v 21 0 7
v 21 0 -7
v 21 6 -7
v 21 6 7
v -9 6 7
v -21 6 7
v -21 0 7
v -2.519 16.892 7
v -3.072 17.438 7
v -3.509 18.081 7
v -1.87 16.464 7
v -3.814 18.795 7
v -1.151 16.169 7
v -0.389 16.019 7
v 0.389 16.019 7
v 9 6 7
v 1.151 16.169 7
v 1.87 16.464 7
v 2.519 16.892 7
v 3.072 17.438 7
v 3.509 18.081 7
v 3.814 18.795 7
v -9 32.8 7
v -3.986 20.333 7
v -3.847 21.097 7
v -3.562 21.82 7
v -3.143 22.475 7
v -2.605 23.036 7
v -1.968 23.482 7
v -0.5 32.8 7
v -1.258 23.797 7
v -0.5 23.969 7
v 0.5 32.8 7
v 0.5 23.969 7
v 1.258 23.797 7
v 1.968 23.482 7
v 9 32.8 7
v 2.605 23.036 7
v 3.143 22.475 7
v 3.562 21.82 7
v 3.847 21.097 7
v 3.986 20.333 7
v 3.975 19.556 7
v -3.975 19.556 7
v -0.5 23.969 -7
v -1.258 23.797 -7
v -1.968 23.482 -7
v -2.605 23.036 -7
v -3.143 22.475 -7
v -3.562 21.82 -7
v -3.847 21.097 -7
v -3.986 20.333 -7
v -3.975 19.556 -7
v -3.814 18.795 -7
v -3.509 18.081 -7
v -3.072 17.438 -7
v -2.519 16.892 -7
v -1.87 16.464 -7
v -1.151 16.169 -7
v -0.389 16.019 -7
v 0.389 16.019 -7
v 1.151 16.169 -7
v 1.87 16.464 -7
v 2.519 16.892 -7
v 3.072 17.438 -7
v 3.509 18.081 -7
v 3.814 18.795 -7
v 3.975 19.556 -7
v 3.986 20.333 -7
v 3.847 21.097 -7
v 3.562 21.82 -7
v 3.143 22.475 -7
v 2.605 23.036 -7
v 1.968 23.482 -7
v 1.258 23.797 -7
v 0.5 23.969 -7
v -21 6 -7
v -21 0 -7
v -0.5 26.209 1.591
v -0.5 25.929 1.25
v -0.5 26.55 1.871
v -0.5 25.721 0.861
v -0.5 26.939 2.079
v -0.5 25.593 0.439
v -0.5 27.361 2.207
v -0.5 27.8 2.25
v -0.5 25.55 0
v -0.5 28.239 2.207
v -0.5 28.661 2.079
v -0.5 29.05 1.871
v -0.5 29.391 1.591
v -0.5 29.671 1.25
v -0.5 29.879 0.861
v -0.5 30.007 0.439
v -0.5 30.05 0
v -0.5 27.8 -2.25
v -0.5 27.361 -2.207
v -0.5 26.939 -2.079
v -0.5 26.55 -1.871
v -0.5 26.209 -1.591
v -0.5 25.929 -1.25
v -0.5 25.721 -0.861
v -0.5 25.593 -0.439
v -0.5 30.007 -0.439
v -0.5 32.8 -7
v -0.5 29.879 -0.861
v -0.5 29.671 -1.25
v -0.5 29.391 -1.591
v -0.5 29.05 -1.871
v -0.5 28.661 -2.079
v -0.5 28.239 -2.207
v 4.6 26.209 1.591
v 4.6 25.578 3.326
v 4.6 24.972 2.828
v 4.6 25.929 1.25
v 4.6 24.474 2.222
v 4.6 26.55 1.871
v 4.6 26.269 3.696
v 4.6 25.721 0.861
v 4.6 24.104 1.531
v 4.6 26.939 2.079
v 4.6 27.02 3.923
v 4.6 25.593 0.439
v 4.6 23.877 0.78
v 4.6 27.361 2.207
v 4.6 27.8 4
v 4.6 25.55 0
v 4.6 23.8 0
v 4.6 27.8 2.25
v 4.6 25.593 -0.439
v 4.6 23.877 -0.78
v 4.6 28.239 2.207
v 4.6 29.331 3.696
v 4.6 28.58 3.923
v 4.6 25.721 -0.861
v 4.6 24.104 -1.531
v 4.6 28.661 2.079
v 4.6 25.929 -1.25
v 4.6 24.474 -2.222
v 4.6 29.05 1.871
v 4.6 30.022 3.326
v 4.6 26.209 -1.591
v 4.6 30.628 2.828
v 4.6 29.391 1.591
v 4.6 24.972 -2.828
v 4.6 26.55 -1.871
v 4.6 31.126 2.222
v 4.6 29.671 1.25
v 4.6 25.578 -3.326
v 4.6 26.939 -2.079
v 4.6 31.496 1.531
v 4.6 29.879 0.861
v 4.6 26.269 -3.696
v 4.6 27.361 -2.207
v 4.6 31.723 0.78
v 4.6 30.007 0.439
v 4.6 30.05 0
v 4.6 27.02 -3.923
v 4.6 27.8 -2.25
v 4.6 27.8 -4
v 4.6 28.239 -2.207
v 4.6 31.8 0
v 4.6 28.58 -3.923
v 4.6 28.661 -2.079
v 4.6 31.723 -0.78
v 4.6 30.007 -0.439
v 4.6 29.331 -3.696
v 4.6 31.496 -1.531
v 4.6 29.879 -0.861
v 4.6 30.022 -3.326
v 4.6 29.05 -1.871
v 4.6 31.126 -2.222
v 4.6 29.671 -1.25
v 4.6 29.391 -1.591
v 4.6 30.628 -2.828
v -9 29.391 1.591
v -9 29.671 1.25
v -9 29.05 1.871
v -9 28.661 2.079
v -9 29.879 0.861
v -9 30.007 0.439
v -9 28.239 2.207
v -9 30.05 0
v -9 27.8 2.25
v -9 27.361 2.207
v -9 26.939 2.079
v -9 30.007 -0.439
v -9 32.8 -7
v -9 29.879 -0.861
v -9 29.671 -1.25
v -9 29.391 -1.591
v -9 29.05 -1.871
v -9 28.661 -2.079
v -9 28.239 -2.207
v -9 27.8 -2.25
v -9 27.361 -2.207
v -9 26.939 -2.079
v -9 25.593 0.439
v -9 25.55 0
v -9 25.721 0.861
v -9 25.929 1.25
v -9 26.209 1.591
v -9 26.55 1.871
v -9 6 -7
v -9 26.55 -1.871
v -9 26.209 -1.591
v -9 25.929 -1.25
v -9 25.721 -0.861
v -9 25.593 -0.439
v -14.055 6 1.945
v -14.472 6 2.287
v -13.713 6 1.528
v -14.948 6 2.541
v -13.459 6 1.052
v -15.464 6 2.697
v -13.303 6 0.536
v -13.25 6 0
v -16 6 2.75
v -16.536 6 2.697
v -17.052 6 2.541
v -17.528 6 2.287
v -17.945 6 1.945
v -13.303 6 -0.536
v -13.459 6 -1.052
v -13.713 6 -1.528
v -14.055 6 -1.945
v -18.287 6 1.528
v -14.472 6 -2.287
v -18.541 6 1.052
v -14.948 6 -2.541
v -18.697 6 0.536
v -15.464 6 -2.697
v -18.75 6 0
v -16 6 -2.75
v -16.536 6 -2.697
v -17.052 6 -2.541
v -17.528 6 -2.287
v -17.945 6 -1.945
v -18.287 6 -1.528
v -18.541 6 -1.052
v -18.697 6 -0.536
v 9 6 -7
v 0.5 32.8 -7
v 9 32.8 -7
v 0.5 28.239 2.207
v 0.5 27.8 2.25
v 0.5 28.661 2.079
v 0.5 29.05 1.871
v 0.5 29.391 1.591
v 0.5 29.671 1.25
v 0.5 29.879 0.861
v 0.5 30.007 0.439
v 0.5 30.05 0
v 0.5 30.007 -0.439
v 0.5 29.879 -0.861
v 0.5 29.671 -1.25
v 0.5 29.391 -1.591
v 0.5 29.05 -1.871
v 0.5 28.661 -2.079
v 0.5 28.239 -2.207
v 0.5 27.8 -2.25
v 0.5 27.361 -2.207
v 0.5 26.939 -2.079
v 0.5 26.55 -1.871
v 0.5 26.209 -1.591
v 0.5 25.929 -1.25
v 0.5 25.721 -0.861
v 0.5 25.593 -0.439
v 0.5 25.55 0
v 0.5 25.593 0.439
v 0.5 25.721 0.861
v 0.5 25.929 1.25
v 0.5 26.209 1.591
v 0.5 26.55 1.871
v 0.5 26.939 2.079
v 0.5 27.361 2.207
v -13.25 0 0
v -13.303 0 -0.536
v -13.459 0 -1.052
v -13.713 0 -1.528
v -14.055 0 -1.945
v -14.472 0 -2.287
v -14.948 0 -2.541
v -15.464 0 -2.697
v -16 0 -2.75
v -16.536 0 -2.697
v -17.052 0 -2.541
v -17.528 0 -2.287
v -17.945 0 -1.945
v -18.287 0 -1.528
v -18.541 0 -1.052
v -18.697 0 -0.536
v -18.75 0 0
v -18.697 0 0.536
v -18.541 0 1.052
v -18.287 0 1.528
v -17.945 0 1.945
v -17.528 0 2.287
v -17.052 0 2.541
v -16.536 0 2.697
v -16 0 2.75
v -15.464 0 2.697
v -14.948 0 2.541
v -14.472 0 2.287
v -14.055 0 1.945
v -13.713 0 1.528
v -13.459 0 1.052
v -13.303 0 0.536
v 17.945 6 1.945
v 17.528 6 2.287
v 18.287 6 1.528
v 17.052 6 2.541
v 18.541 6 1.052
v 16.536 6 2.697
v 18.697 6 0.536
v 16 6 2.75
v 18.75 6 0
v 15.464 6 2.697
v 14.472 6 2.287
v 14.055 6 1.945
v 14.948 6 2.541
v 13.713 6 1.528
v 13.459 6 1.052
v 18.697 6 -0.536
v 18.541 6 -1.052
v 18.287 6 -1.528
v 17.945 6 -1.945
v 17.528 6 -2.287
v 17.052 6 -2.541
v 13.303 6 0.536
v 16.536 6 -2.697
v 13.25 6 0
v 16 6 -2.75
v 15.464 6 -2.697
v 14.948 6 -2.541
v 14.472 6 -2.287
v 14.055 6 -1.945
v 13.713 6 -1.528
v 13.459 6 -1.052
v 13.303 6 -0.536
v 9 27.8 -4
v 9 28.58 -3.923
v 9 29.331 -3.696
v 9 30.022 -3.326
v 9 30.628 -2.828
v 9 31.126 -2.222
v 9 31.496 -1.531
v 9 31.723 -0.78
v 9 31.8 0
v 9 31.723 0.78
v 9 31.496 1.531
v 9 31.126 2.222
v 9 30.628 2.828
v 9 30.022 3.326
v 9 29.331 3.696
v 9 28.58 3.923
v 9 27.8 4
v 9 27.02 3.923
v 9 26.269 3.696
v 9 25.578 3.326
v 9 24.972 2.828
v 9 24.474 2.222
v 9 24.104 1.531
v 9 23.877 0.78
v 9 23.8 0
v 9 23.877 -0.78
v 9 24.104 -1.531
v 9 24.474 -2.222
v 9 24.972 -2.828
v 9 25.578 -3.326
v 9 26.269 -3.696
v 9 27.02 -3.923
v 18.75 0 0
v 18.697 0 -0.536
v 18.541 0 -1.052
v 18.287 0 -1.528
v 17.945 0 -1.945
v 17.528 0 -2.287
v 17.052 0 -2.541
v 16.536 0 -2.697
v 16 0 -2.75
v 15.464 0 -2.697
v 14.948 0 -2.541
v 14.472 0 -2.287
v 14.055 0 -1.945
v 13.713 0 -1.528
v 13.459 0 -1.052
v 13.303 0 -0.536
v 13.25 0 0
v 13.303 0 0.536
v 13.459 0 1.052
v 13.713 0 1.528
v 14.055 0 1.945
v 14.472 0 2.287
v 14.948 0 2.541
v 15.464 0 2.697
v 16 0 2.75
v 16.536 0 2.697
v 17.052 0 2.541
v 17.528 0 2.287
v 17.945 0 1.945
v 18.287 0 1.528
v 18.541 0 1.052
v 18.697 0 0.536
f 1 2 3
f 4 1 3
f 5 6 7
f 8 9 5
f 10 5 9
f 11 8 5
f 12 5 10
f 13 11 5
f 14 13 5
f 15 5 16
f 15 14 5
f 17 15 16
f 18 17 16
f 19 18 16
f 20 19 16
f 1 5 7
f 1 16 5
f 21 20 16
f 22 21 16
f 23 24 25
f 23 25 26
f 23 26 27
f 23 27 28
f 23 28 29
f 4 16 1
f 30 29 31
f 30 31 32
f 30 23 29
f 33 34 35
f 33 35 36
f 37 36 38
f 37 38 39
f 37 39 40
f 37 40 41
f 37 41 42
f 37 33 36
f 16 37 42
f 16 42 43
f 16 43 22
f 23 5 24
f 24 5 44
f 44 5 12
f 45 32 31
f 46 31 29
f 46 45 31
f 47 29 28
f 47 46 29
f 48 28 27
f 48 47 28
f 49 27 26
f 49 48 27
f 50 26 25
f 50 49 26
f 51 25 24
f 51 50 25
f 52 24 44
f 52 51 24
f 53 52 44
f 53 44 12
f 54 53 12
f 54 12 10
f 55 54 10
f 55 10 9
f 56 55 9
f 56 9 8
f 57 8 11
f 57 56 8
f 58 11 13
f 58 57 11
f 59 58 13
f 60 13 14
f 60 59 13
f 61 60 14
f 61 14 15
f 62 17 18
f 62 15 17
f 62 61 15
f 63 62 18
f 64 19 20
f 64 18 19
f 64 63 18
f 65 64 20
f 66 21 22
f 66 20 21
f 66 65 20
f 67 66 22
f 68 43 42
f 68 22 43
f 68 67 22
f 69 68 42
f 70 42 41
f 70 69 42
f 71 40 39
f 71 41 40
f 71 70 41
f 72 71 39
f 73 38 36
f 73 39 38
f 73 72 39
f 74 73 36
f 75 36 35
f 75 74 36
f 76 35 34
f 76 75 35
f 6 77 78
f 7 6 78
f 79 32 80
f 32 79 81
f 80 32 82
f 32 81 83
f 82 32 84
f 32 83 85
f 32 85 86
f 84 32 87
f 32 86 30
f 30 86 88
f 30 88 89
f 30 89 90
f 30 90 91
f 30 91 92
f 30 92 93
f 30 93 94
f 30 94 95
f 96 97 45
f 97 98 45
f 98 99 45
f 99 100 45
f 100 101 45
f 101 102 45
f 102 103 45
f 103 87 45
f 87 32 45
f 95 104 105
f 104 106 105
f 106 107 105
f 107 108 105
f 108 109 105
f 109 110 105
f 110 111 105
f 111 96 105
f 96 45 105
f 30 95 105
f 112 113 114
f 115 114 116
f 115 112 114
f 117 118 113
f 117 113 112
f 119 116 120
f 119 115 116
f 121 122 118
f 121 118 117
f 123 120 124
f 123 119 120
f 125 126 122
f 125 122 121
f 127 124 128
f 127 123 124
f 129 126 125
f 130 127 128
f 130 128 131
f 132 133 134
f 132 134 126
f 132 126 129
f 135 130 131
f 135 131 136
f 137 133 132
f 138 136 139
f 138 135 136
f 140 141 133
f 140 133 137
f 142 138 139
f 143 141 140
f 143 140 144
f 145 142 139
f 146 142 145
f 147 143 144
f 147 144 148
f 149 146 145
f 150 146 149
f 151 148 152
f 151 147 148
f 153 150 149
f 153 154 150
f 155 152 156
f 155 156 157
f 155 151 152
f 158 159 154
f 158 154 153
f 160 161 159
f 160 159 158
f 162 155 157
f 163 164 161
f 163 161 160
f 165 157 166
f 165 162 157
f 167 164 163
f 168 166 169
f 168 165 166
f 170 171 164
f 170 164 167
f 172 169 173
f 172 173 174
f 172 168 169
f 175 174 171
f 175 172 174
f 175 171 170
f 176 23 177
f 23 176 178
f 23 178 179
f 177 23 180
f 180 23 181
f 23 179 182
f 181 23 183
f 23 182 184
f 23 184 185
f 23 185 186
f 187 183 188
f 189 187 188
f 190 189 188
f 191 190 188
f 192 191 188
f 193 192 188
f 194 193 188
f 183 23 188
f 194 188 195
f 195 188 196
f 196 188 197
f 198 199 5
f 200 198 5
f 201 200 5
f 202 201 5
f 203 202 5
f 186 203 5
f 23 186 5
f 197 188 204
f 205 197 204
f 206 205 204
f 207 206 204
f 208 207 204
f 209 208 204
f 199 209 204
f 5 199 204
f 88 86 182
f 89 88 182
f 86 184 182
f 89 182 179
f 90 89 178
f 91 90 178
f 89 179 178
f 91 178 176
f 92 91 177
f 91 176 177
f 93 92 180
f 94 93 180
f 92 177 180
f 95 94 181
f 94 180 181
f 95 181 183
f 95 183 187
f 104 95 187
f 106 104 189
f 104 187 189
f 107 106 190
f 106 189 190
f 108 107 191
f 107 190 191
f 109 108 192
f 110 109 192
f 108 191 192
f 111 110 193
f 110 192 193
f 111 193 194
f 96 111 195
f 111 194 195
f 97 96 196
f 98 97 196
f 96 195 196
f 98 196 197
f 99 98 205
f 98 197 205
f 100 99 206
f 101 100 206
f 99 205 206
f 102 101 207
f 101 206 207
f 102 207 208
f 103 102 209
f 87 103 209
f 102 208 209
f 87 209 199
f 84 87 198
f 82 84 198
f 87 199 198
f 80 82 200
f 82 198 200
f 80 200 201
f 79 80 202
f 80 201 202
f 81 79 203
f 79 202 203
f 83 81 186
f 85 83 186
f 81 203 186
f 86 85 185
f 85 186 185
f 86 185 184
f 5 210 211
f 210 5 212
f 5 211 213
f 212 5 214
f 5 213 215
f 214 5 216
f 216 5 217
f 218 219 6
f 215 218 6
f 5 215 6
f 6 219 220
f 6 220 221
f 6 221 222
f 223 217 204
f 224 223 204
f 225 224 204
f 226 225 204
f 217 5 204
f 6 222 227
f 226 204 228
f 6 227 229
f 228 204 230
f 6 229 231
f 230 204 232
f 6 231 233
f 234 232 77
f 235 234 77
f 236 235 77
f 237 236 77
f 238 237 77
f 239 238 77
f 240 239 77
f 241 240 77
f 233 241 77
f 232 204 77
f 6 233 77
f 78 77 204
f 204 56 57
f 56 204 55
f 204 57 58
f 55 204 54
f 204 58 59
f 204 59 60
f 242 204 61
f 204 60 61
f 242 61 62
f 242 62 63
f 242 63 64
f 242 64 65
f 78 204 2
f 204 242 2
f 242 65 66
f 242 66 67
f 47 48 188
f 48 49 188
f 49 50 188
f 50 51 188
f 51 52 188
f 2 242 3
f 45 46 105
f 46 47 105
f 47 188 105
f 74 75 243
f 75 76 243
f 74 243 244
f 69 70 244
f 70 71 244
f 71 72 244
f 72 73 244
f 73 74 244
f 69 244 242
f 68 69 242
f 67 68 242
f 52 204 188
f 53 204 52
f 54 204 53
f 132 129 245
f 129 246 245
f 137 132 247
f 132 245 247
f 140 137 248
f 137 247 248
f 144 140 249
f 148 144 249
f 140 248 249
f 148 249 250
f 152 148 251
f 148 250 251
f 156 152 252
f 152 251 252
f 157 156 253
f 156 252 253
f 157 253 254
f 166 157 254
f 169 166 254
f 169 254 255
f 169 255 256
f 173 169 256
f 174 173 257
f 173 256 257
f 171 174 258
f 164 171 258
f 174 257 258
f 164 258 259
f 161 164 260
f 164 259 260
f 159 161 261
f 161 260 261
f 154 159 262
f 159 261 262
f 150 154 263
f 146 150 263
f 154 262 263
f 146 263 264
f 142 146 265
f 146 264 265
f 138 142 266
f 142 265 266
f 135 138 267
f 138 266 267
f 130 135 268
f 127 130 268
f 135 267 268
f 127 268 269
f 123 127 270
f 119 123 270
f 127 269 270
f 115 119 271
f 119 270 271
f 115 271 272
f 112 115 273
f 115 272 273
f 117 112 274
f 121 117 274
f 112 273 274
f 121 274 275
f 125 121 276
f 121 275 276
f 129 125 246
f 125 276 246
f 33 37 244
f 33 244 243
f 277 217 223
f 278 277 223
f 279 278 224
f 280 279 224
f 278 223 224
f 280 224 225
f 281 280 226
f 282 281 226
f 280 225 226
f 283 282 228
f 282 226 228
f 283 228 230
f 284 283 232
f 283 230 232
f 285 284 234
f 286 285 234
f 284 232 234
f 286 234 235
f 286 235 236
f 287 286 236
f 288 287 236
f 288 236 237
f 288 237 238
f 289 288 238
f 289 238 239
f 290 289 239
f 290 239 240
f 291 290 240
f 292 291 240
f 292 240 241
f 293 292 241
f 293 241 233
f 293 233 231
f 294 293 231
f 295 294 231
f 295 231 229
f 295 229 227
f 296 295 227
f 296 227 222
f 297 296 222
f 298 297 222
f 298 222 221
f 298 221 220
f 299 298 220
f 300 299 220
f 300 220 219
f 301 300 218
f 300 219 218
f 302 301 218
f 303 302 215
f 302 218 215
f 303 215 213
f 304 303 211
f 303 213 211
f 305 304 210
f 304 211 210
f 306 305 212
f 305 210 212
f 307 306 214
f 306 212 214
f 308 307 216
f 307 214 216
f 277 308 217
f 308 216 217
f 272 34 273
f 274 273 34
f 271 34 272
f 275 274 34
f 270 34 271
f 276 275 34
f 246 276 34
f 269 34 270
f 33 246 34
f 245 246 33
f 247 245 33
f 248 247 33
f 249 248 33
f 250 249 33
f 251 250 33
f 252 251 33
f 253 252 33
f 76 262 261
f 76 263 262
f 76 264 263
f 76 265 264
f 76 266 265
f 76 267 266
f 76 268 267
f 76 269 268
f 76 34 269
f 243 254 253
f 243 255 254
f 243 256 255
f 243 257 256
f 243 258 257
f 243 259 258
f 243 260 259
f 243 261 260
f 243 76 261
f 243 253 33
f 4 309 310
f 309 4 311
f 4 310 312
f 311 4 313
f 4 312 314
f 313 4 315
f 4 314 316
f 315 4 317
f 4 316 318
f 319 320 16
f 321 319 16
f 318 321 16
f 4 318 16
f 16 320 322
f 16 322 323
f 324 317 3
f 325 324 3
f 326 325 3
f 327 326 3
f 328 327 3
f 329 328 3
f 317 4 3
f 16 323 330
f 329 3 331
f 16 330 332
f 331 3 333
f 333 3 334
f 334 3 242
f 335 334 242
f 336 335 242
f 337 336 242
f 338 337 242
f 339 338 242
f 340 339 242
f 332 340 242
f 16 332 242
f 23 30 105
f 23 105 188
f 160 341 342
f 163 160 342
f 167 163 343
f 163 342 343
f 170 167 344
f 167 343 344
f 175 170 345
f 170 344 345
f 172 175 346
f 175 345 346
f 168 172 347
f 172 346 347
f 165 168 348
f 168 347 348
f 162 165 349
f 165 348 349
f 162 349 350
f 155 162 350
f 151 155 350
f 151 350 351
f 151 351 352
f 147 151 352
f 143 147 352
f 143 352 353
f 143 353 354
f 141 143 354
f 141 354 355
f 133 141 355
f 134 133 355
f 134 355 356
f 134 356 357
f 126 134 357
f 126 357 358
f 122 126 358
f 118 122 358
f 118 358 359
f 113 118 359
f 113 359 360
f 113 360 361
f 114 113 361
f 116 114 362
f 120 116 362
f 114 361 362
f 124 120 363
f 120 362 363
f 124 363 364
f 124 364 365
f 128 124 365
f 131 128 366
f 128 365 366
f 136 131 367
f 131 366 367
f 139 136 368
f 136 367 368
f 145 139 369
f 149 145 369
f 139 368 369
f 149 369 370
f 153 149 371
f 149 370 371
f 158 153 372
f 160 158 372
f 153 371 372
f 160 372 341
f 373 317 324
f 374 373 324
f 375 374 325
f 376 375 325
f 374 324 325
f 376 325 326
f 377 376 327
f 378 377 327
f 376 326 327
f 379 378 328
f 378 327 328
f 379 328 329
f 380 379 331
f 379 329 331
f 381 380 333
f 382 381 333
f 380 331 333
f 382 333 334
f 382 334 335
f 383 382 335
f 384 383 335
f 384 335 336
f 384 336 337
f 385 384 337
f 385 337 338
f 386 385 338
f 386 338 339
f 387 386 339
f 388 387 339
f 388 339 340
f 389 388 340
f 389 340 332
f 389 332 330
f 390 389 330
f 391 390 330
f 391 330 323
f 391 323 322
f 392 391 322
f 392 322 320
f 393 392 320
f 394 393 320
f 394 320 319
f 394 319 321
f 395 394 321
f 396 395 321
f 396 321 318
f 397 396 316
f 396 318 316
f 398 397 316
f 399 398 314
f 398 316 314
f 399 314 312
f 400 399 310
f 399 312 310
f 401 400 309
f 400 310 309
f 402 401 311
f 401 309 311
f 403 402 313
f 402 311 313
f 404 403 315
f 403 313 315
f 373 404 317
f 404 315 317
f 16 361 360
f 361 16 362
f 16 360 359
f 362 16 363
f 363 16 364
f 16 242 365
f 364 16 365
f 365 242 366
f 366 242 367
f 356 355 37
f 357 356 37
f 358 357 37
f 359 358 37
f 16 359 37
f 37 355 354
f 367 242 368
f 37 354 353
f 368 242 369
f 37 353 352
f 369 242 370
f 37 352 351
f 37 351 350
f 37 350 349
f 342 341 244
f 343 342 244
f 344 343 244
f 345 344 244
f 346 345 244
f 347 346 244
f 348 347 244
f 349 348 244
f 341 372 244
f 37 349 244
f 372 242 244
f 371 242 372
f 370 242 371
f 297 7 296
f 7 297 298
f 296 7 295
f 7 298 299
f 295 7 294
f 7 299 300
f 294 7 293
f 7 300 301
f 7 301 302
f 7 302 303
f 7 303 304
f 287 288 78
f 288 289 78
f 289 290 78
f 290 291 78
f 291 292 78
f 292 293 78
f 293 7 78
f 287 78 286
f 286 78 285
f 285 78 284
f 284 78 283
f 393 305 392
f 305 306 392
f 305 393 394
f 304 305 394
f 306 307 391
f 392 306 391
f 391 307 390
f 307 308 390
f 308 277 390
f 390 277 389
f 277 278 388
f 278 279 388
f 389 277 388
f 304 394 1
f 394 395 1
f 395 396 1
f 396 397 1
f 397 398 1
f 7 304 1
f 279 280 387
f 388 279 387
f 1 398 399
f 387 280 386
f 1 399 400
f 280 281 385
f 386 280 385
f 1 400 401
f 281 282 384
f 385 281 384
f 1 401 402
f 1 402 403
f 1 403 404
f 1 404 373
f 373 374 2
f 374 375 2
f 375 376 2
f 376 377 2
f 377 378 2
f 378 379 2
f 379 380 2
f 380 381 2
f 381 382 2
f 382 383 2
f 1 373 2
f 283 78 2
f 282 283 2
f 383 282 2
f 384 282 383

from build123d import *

# Parameters (mm, degrees)
SALIENTE_EXTRUIR1_DEPTH                              = 7
SALIENTE_EXTRUIR1_DEPTH_BACK                         = 7
CROQUIS1_R                                           = 4
TALADRO_DE_MARGEN_PARA_M51_D                         = 5.5
CORTAR_EXTRUIR1_DEPTH                                = 40.570696228
CORTAR_EXTRUIR1_DEPTH_BACK                           = 40.570696228
CROQUIS6_W                                           = 1
CROQUIS6_H                                           = 17.84861806
REFRENTADO_PARA_TORNILLO_CON_CABEZA_HUEC_D           = 4.5
REFRENTADO_PARA_TORNILLO_CON_CABEZA_HUEC_CBORE_D     = 8
REFRENTADO_PARA_TORNILLO_CON_CABEZA_HUEC_CBORE_DEPTH = 4.4


with BuildPart() as part:
    # Croquis1 → Saliente-Extruir1 (new, two sides: drawn at the far end of the back side and taken through both)
    with BuildSketch(Plane.XY.offset(-SALIENTE_EXTRUIR1_DEPTH_BACK)):
        Polygon((-21, 0), (21, 0), (21, 6), (9, 6), (9, 32.8), (-9, 32.8), (-9, 6), (-21, 6), align=None)
        with Locations((0, 20)):
            Circle(CROQUIS1_R, mode=Mode.SUBTRACT)
    extrude(amount=SALIENTE_EXTRUIR1_DEPTH + SALIENTE_EXTRUIR1_DEPTH_BACK)

    # Taladro de margen para M51 (through all)
    with Locations(Plane(origin=(0, 0, 0), x_dir=(-1, 0, 0), z_dir=(0, -1, 0))):
        with Locations((-16, 0), (16, 0)):
            Hole(TALADRO_DE_MARGEN_PARA_M51_D / 2)

    # Croquis6 → Cortar-Extruir1 (cut, two sides: drawn at the far end of the back side and taken through both)
    with BuildSketch(Plane.XY.offset(-CORTAR_EXTRUIR1_DEPTH_BACK)):
        with Locations((0, 28.92430903)):
            Rectangle(CROQUIS6_W, CROQUIS6_H)
    extrude(amount=CORTAR_EXTRUIR1_DEPTH + CORTAR_EXTRUIR1_DEPTH_BACK, mode=Mode.SUBTRACT)

    # Refrentado para tornillo con cabeza hueca de M41 (through all)
    with Locations(Plane(origin=(9, 0, 0), x_dir=(0, 0, -1), z_dir=(1, 0, 0))):
        with Locations((0, 27.8)):
            CounterBoreHole(REFRENTADO_PARA_TORNILLO_CON_CABEZA_HUEC_D / 2, REFRENTADO_PARA_TORNILLO_CON_CABEZA_HUEC_CBORE_D / 2, REFRENTADO_PARA_TORNILLO_CON_CABEZA_HUEC_CBORE_DEPTH)


solid = part.part
